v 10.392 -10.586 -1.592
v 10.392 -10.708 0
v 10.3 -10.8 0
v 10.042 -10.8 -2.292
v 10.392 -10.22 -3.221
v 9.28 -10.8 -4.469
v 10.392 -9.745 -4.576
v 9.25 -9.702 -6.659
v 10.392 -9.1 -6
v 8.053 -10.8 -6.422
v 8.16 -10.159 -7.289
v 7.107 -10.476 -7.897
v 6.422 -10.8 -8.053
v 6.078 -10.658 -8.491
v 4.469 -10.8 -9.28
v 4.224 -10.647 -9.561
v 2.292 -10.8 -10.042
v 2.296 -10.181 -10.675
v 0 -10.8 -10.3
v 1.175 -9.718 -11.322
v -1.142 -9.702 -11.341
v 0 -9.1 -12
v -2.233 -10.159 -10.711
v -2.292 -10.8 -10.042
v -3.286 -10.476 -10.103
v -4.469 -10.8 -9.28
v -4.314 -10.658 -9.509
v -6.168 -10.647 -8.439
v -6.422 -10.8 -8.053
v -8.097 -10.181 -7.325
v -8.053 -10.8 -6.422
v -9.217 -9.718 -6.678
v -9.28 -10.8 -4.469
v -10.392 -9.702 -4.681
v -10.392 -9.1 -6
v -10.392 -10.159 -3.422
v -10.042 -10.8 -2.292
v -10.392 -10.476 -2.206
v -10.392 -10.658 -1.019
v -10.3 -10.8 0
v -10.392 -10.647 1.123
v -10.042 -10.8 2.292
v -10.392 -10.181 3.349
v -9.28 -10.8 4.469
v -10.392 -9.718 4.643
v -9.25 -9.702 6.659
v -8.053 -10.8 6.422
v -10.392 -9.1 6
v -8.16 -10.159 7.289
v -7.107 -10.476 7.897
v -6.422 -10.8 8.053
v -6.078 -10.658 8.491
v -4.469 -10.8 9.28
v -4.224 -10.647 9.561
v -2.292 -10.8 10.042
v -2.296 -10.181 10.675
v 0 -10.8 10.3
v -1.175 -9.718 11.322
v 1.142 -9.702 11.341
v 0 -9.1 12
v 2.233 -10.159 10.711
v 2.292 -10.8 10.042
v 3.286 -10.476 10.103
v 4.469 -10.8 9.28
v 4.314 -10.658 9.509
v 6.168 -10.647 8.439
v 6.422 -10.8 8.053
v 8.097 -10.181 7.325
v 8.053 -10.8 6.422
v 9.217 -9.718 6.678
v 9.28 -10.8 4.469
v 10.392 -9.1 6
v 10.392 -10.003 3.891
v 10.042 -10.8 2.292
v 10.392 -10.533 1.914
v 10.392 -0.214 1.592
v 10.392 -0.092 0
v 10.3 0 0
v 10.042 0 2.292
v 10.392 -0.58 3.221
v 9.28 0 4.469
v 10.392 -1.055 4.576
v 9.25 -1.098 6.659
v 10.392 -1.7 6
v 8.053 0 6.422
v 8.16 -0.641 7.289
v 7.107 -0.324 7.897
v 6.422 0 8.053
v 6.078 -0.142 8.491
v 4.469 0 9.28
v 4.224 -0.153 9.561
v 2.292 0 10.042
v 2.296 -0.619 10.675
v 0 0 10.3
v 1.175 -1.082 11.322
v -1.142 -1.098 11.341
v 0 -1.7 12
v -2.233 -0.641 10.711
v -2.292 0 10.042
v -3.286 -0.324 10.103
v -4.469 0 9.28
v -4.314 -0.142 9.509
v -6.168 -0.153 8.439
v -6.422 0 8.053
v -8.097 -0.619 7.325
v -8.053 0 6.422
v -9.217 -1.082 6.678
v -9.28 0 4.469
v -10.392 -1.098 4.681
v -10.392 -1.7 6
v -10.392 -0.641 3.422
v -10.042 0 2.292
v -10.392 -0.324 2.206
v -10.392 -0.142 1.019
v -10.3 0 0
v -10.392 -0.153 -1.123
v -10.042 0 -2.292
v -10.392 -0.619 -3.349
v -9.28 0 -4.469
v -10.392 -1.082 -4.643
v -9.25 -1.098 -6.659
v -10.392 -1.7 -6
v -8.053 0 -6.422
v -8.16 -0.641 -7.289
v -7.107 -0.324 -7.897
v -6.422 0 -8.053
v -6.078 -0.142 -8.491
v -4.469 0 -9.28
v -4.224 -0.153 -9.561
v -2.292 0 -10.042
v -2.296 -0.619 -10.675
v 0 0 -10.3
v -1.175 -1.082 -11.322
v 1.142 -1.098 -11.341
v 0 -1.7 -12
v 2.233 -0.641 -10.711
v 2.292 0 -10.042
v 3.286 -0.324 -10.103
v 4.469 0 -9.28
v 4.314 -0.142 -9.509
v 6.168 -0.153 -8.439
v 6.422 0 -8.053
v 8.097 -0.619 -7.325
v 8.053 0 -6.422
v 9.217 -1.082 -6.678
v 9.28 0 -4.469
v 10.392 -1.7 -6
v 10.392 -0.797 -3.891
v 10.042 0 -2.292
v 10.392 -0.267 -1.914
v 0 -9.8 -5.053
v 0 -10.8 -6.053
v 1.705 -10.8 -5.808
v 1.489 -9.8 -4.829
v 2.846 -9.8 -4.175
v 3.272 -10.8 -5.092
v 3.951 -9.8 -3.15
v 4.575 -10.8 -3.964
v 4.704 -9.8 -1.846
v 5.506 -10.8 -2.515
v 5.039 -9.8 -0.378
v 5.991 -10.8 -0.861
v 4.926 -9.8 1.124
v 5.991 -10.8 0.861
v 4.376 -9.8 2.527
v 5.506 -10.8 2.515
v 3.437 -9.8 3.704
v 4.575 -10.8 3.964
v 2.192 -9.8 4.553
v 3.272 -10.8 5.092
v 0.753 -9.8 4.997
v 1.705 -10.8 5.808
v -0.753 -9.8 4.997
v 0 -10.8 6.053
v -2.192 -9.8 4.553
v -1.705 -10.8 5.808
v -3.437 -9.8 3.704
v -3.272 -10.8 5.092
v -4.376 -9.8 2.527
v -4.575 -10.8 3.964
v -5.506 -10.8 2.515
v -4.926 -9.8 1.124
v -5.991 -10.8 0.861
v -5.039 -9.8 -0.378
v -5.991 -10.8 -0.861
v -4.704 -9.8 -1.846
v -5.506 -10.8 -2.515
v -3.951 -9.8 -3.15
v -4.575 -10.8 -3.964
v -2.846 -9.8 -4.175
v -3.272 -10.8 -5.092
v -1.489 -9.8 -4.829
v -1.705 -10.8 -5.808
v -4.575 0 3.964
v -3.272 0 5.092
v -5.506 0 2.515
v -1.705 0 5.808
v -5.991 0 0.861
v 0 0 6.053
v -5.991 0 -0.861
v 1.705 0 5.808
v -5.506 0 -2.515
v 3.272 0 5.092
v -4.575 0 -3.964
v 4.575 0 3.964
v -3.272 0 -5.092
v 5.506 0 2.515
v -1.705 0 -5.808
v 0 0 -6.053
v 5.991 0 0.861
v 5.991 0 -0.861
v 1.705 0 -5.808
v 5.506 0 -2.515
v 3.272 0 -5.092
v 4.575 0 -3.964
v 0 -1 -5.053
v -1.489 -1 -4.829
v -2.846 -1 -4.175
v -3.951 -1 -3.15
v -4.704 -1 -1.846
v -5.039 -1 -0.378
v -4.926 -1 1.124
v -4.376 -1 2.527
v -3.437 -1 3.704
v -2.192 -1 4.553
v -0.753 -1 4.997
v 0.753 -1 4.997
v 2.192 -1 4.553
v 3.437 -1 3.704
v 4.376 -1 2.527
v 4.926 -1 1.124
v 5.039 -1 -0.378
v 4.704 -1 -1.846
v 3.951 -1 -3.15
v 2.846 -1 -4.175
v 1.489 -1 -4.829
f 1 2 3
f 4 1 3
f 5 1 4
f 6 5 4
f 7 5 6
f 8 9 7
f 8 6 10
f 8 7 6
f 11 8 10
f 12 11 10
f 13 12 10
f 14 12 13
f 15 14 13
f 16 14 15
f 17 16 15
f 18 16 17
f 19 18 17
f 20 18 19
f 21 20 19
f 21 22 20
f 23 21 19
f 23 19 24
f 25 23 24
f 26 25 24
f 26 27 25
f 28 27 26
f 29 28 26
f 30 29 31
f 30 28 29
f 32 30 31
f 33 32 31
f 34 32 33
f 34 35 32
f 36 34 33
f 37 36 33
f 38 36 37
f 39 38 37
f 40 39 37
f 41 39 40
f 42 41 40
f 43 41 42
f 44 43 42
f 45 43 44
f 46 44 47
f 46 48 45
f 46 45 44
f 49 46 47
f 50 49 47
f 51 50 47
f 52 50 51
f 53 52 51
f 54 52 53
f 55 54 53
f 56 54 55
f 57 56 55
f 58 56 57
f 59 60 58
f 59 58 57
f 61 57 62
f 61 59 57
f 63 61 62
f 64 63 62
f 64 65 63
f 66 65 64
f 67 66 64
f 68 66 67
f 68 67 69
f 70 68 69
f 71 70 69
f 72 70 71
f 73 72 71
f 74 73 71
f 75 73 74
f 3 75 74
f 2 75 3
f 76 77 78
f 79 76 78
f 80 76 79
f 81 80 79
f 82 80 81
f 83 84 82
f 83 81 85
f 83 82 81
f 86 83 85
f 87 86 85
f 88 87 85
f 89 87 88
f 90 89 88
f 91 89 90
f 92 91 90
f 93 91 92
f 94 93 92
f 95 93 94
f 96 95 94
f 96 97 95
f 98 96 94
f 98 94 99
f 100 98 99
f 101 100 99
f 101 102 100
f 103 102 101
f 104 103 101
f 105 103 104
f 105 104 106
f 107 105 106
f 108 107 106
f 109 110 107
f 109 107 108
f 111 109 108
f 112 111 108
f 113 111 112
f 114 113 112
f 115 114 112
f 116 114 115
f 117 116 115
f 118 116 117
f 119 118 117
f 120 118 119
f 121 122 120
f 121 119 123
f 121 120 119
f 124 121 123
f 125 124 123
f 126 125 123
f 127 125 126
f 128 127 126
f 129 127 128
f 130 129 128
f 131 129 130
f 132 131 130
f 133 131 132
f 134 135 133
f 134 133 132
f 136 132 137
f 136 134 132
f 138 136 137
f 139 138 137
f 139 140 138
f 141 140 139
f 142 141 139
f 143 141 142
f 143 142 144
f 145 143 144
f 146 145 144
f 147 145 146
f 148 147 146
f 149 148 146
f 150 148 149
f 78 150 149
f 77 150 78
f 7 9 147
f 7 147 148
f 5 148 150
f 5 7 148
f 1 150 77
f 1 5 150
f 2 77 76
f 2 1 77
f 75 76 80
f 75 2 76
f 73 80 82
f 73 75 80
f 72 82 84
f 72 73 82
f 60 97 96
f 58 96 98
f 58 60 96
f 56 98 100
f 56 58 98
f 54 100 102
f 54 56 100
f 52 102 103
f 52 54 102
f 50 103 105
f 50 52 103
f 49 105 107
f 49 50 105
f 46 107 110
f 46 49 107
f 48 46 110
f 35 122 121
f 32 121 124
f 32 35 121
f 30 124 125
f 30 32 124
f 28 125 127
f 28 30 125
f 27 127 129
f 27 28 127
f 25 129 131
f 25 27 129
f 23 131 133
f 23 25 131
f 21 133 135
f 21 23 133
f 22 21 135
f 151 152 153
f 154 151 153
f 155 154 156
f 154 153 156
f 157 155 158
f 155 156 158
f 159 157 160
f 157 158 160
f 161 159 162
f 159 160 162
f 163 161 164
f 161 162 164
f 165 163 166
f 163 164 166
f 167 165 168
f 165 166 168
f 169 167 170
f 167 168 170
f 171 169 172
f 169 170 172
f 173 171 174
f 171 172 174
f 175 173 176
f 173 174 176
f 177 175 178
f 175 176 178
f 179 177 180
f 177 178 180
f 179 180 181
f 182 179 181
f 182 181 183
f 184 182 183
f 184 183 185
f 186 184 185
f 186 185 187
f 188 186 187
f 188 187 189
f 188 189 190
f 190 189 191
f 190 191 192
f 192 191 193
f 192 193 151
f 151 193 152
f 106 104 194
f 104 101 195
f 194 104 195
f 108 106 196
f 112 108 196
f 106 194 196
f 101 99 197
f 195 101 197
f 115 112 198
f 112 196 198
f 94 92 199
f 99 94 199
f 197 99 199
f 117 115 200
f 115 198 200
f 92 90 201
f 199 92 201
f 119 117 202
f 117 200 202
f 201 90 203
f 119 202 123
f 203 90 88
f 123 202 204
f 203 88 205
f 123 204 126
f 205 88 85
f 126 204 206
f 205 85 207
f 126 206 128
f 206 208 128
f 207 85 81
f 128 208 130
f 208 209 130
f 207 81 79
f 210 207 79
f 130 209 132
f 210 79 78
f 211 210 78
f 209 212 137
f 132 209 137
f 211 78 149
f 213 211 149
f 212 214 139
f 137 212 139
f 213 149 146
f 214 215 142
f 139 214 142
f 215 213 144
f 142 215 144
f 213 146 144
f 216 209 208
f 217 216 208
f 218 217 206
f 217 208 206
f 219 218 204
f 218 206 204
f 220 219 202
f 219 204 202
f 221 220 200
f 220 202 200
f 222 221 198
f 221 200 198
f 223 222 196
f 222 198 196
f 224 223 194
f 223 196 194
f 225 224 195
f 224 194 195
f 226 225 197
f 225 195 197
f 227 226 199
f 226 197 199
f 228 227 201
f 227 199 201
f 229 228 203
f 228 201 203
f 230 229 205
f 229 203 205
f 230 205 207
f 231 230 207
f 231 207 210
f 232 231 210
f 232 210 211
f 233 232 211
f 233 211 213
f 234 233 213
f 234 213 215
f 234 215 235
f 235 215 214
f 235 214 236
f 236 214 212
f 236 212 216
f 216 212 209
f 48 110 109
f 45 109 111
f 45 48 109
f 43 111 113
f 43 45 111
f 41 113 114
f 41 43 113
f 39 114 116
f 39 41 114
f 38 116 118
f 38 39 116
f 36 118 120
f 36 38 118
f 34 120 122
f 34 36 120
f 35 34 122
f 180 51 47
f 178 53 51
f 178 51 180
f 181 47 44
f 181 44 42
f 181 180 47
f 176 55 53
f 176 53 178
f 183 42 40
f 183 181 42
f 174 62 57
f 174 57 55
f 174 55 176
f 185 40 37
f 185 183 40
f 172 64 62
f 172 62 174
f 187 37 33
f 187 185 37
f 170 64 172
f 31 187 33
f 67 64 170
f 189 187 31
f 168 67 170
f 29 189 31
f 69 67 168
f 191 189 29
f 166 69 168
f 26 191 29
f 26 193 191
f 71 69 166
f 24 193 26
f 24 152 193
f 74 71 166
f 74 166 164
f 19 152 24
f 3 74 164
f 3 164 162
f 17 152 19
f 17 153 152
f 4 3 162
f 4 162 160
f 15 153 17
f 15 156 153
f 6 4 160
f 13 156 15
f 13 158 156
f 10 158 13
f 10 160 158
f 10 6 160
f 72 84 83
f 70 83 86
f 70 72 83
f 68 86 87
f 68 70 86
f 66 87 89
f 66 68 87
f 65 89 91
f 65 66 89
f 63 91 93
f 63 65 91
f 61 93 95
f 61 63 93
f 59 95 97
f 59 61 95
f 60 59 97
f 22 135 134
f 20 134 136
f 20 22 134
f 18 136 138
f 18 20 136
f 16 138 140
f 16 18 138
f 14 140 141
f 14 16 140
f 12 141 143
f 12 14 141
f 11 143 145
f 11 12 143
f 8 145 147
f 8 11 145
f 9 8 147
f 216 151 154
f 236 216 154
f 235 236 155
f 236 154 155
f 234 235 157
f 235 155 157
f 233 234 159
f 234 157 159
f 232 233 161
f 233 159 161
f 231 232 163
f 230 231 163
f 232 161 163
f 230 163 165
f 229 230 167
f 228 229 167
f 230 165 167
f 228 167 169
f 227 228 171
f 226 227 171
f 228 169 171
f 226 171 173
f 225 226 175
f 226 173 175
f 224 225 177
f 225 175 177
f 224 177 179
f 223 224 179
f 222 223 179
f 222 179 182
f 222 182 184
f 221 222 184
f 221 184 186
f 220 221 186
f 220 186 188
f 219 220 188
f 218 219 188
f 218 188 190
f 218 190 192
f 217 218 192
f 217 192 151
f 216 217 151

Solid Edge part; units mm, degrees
sketch "Sketch1" plane through (0, 0, 0) normal (0, -1, 0) x (1, 0, 0)
  circle A0 centre (0, 0) radius 12
extrude "Protrusion1" add sketch "Sketch1" along normal blind 10.8
chamfer "Chamfer_1" distance 1.7 angle 45 2 edges at (-12, -10.8, 0) (-12, 0, 0)
sketch "Sketch2" plane through (0, -10.8, 0) normal (0, -1, 0) x (1, 0, 0)
  line L0 (0, 12) -> (-10.3923, 6)
  line L1 (-10.3923, 6) -> (-13.1704, 9.9939)
  line L2 (-13.1704, 9.9939) -> (-1.4905, 14.5877)
  line L3 (-1.4905, 14.5877) -> (0, 12)
extrude "ExtrudedCutout_1" cut sketch "Sketch2" against normal blind 81.3692
pattern_circular "Pattern1" count 6 over 360 about axis through (0, -10.8, 0) along (0, -1, 0) of "ExtrudedCutout_1"
hole "Hole_1" at (0, -10.8, 0) direction (0, 1, 0) diameter 10.106 end up to next
chamfer "Chamfer_2" distance 1 angle 45 2 edges at (-5.053, -10.8, 0) (0, 0, -5.053)
